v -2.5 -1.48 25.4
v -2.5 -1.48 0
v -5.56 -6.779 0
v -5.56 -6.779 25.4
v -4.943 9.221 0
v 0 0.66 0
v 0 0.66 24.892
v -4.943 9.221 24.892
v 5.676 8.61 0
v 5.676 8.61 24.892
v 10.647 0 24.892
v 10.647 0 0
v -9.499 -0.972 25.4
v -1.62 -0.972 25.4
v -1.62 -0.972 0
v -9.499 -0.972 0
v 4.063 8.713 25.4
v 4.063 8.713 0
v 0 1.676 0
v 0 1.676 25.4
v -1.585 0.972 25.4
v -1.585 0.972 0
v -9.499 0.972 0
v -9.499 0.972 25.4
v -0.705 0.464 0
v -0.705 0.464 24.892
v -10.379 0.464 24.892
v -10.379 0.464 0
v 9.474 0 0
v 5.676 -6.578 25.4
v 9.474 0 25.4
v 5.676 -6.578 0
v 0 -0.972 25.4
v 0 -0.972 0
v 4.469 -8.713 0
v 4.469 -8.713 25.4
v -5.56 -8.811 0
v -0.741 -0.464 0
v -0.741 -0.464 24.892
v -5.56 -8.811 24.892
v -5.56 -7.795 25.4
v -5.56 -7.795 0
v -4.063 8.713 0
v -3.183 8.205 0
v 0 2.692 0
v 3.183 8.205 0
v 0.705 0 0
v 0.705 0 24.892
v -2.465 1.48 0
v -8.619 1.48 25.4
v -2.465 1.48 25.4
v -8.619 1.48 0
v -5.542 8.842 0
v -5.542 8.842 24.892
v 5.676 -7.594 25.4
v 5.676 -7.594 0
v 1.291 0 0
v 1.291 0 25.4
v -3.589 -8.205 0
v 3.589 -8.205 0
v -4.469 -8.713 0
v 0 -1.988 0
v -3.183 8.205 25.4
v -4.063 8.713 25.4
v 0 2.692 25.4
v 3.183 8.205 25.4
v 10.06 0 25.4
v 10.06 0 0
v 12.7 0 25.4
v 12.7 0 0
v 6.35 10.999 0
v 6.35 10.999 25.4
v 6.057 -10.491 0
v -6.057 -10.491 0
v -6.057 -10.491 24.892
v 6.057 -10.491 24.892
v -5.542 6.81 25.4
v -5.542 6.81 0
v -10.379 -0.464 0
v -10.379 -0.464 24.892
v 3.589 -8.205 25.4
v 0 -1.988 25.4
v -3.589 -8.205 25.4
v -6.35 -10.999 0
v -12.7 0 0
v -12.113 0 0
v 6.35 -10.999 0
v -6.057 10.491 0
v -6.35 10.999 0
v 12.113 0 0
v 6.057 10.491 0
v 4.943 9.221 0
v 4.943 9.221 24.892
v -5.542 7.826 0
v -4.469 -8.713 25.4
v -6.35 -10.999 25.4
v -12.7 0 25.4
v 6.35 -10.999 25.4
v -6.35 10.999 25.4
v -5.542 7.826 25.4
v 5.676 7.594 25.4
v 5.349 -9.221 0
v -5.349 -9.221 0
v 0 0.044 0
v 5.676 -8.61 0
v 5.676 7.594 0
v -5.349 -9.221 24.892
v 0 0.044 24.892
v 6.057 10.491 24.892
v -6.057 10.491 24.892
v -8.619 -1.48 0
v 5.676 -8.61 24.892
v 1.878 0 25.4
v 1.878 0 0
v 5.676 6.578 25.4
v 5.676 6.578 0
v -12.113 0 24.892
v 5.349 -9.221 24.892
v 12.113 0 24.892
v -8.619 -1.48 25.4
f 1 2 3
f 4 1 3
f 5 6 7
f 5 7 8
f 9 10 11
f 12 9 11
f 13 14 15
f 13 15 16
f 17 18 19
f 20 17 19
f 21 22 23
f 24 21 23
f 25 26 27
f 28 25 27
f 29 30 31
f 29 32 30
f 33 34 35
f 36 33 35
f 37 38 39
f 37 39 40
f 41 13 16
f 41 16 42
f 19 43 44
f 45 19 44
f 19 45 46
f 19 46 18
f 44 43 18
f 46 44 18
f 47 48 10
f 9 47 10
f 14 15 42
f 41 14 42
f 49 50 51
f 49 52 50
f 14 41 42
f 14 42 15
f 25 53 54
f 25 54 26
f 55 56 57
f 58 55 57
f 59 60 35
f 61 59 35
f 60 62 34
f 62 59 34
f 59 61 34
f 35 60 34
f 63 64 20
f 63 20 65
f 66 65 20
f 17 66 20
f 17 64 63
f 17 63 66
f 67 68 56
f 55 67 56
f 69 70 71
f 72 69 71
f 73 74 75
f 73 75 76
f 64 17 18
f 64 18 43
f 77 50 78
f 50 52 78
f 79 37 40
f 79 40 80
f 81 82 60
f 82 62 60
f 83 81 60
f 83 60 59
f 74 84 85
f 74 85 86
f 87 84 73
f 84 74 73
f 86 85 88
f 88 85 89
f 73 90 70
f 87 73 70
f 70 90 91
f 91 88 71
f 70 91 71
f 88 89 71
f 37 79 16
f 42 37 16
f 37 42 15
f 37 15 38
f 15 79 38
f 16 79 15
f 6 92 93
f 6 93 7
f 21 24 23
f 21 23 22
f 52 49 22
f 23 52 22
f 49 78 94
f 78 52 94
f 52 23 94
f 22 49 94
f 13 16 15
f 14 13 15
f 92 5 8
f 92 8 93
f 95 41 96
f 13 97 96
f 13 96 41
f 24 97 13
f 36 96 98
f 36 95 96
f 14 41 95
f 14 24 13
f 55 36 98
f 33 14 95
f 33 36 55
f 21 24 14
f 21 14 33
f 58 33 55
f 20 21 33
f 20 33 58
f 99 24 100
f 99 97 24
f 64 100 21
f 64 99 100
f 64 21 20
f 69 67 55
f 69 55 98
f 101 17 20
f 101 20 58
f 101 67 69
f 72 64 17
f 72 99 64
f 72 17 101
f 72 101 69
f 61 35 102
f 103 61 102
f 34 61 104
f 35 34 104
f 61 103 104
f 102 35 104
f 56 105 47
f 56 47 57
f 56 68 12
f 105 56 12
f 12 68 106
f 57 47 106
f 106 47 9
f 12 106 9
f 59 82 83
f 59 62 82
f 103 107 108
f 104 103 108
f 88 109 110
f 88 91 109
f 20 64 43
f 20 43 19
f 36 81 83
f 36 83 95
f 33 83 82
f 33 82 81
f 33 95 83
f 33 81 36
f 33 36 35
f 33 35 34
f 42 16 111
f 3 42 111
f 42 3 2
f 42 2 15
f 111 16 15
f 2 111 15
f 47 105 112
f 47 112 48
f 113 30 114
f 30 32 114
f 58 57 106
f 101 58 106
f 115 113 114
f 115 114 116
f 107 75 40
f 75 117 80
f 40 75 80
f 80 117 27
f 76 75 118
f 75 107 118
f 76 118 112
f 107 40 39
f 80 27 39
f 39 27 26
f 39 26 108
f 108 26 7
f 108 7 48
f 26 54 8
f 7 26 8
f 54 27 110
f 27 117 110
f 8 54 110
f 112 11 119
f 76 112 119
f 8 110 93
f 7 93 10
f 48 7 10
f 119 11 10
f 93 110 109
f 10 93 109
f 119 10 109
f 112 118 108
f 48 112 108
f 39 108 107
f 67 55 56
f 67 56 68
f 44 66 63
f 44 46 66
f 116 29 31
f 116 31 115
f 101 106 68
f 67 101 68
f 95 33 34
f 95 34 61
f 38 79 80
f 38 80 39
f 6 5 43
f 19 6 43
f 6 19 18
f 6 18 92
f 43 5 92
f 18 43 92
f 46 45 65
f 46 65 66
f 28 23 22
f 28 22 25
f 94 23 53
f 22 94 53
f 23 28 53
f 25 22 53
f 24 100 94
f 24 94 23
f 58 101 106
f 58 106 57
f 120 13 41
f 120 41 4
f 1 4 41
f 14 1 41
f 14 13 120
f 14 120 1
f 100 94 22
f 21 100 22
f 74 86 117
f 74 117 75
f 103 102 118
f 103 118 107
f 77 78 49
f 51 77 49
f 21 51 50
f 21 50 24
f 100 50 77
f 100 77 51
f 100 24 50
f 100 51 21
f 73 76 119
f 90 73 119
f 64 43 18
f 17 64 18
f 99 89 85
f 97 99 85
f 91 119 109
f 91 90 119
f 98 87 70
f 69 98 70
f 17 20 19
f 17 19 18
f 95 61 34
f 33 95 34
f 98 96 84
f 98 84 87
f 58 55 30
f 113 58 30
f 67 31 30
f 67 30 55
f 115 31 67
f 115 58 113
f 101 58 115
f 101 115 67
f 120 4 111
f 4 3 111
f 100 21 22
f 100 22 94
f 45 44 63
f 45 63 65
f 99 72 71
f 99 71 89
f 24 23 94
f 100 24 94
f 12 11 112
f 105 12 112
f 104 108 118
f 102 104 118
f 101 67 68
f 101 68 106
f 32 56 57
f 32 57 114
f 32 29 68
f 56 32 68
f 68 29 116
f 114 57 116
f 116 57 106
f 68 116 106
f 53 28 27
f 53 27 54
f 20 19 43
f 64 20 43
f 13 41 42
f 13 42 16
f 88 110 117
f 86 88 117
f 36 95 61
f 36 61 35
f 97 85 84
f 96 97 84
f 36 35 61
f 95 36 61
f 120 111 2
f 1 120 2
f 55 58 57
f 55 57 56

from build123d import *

# Parameters (mm, degrees)
F4_DEPTH = 25.4
F5_DEPTH = 25.4
F6_T     = -0.508
F7_T     = -0.508


# Not quite as in the source:
# - a shell that OpenCascade refuses in one call is made with other operations: the cavity is built on its own and cut out


with BuildPart() as f4:
    # F1 (on Top) → F4 (new body)
    with BuildSketch(Plane.XY):
        Polygon((-6.35, 10.9985226281), (-12.7, 0), (-6.35, -10.9985226281), (6.35, -10.9985226281), (12.7, 0), (6.35, 10.9985226281), align=None)
        Polygon((-5.5598110337, -7.7951700653), (-9.4991829533, -0.9719777506), (-1.620439114, -0.9719777506), align=None, mode=Mode.SUBTRACT)
        Polygon((-4.4690056687, -8.7125226281), (0, -0.9719777506), (4.4690056687, -8.7125226281), align=None, mode=Mode.SUBTRACT)
        Polygon((1.2914098768, 0), (5.675882223, 7.5941288681), (10.0603545693, 0), (5.675882223, -7.5941288681), align=None, mode=Mode.SUBTRACT)
        Polygon((-9.4991829533, 0.9719777506), (-5.5421208235, 7.8258104081), (-1.5850586937, 0.9719777506), align=None, mode=Mode.SUBTRACT)
        Polygon((-4.0627585811, 8.7125226281), (4.0627585811, 8.7125226281), (0, 1.6756183468), align=None, mode=Mode.SUBTRACT)
    extrude(amount=F4_DEPTH)

    # F7
    f7_openings = [f4.faces().sort_by_distance(p)[0] for p in [
        (-0.332472, 0.12346, 0),
    ]]
    offset(amount=F7_T, openings=f7_openings, kind=Kind.INTERSECTION)


with BuildPart() as f5:
    # F3 (on offset) → F5 (new body)
    with BuildSketch(Plane.XY.offset(25.4)):
        Polygon((10.0603545693, 0), (5.675882223, 7.5941288681), (1.2914098768, 0), (5.675882223, -7.5941288681), align=None)
        Polygon((0, 1.6756183468), (4.0627585811, 8.7125226281), (-4.0627585811, 8.7125226281), align=None)
        Polygon((-1.5850586937, 0.9719777506), (-5.5421208235, 7.8258104081), (-9.4991829533, 0.9719777506), align=None)
        Polygon((-1.620439114, -0.9719777506), (-9.4991829533, -0.9719777506), (-5.5598110337, -7.7951700653), align=None)
        Polygon((4.4690056687, -8.7125226281), (0, -0.9719777506), (-4.4690056687, -8.7125226281), align=None)
    extrude(amount=-F5_DEPTH)

    # F6: a shell. OpenCascade refuses it in one call, so the cavity is built on its own and cut out:
    # the body offset inwards by the wall thickness, plus a prism from it out through each open face.
    f6_core = offset(f5.part, amount=F6_T, mode=Mode.PRIVATE)
    f6_exits = [f6_core.faces().sort_by_distance(p)[0] for p in [
        (5.675882, 0, 0.508),
        (0, -6.132341, 0.508),
        (-5.559811, -3.246375, 0.508),
        (-5.542121, 3.256589, 0.508),
        (0, 6.366888, 0.508),
        (-5.542121, 3.256589, 24.892),
        (0, 6.366888, 24.892),
        (5.675882, 0, 24.892),
        (0, -6.132341, 24.892),
        (-5.559811, -3.246375, 24.892),
    ]]
    add(f6_core, mode=Mode.SUBTRACT)
    extrude(f6_exits, amount=-F6_T, mode=Mode.SUBTRACT)


solid = Compound([f4.part, f5.part])
